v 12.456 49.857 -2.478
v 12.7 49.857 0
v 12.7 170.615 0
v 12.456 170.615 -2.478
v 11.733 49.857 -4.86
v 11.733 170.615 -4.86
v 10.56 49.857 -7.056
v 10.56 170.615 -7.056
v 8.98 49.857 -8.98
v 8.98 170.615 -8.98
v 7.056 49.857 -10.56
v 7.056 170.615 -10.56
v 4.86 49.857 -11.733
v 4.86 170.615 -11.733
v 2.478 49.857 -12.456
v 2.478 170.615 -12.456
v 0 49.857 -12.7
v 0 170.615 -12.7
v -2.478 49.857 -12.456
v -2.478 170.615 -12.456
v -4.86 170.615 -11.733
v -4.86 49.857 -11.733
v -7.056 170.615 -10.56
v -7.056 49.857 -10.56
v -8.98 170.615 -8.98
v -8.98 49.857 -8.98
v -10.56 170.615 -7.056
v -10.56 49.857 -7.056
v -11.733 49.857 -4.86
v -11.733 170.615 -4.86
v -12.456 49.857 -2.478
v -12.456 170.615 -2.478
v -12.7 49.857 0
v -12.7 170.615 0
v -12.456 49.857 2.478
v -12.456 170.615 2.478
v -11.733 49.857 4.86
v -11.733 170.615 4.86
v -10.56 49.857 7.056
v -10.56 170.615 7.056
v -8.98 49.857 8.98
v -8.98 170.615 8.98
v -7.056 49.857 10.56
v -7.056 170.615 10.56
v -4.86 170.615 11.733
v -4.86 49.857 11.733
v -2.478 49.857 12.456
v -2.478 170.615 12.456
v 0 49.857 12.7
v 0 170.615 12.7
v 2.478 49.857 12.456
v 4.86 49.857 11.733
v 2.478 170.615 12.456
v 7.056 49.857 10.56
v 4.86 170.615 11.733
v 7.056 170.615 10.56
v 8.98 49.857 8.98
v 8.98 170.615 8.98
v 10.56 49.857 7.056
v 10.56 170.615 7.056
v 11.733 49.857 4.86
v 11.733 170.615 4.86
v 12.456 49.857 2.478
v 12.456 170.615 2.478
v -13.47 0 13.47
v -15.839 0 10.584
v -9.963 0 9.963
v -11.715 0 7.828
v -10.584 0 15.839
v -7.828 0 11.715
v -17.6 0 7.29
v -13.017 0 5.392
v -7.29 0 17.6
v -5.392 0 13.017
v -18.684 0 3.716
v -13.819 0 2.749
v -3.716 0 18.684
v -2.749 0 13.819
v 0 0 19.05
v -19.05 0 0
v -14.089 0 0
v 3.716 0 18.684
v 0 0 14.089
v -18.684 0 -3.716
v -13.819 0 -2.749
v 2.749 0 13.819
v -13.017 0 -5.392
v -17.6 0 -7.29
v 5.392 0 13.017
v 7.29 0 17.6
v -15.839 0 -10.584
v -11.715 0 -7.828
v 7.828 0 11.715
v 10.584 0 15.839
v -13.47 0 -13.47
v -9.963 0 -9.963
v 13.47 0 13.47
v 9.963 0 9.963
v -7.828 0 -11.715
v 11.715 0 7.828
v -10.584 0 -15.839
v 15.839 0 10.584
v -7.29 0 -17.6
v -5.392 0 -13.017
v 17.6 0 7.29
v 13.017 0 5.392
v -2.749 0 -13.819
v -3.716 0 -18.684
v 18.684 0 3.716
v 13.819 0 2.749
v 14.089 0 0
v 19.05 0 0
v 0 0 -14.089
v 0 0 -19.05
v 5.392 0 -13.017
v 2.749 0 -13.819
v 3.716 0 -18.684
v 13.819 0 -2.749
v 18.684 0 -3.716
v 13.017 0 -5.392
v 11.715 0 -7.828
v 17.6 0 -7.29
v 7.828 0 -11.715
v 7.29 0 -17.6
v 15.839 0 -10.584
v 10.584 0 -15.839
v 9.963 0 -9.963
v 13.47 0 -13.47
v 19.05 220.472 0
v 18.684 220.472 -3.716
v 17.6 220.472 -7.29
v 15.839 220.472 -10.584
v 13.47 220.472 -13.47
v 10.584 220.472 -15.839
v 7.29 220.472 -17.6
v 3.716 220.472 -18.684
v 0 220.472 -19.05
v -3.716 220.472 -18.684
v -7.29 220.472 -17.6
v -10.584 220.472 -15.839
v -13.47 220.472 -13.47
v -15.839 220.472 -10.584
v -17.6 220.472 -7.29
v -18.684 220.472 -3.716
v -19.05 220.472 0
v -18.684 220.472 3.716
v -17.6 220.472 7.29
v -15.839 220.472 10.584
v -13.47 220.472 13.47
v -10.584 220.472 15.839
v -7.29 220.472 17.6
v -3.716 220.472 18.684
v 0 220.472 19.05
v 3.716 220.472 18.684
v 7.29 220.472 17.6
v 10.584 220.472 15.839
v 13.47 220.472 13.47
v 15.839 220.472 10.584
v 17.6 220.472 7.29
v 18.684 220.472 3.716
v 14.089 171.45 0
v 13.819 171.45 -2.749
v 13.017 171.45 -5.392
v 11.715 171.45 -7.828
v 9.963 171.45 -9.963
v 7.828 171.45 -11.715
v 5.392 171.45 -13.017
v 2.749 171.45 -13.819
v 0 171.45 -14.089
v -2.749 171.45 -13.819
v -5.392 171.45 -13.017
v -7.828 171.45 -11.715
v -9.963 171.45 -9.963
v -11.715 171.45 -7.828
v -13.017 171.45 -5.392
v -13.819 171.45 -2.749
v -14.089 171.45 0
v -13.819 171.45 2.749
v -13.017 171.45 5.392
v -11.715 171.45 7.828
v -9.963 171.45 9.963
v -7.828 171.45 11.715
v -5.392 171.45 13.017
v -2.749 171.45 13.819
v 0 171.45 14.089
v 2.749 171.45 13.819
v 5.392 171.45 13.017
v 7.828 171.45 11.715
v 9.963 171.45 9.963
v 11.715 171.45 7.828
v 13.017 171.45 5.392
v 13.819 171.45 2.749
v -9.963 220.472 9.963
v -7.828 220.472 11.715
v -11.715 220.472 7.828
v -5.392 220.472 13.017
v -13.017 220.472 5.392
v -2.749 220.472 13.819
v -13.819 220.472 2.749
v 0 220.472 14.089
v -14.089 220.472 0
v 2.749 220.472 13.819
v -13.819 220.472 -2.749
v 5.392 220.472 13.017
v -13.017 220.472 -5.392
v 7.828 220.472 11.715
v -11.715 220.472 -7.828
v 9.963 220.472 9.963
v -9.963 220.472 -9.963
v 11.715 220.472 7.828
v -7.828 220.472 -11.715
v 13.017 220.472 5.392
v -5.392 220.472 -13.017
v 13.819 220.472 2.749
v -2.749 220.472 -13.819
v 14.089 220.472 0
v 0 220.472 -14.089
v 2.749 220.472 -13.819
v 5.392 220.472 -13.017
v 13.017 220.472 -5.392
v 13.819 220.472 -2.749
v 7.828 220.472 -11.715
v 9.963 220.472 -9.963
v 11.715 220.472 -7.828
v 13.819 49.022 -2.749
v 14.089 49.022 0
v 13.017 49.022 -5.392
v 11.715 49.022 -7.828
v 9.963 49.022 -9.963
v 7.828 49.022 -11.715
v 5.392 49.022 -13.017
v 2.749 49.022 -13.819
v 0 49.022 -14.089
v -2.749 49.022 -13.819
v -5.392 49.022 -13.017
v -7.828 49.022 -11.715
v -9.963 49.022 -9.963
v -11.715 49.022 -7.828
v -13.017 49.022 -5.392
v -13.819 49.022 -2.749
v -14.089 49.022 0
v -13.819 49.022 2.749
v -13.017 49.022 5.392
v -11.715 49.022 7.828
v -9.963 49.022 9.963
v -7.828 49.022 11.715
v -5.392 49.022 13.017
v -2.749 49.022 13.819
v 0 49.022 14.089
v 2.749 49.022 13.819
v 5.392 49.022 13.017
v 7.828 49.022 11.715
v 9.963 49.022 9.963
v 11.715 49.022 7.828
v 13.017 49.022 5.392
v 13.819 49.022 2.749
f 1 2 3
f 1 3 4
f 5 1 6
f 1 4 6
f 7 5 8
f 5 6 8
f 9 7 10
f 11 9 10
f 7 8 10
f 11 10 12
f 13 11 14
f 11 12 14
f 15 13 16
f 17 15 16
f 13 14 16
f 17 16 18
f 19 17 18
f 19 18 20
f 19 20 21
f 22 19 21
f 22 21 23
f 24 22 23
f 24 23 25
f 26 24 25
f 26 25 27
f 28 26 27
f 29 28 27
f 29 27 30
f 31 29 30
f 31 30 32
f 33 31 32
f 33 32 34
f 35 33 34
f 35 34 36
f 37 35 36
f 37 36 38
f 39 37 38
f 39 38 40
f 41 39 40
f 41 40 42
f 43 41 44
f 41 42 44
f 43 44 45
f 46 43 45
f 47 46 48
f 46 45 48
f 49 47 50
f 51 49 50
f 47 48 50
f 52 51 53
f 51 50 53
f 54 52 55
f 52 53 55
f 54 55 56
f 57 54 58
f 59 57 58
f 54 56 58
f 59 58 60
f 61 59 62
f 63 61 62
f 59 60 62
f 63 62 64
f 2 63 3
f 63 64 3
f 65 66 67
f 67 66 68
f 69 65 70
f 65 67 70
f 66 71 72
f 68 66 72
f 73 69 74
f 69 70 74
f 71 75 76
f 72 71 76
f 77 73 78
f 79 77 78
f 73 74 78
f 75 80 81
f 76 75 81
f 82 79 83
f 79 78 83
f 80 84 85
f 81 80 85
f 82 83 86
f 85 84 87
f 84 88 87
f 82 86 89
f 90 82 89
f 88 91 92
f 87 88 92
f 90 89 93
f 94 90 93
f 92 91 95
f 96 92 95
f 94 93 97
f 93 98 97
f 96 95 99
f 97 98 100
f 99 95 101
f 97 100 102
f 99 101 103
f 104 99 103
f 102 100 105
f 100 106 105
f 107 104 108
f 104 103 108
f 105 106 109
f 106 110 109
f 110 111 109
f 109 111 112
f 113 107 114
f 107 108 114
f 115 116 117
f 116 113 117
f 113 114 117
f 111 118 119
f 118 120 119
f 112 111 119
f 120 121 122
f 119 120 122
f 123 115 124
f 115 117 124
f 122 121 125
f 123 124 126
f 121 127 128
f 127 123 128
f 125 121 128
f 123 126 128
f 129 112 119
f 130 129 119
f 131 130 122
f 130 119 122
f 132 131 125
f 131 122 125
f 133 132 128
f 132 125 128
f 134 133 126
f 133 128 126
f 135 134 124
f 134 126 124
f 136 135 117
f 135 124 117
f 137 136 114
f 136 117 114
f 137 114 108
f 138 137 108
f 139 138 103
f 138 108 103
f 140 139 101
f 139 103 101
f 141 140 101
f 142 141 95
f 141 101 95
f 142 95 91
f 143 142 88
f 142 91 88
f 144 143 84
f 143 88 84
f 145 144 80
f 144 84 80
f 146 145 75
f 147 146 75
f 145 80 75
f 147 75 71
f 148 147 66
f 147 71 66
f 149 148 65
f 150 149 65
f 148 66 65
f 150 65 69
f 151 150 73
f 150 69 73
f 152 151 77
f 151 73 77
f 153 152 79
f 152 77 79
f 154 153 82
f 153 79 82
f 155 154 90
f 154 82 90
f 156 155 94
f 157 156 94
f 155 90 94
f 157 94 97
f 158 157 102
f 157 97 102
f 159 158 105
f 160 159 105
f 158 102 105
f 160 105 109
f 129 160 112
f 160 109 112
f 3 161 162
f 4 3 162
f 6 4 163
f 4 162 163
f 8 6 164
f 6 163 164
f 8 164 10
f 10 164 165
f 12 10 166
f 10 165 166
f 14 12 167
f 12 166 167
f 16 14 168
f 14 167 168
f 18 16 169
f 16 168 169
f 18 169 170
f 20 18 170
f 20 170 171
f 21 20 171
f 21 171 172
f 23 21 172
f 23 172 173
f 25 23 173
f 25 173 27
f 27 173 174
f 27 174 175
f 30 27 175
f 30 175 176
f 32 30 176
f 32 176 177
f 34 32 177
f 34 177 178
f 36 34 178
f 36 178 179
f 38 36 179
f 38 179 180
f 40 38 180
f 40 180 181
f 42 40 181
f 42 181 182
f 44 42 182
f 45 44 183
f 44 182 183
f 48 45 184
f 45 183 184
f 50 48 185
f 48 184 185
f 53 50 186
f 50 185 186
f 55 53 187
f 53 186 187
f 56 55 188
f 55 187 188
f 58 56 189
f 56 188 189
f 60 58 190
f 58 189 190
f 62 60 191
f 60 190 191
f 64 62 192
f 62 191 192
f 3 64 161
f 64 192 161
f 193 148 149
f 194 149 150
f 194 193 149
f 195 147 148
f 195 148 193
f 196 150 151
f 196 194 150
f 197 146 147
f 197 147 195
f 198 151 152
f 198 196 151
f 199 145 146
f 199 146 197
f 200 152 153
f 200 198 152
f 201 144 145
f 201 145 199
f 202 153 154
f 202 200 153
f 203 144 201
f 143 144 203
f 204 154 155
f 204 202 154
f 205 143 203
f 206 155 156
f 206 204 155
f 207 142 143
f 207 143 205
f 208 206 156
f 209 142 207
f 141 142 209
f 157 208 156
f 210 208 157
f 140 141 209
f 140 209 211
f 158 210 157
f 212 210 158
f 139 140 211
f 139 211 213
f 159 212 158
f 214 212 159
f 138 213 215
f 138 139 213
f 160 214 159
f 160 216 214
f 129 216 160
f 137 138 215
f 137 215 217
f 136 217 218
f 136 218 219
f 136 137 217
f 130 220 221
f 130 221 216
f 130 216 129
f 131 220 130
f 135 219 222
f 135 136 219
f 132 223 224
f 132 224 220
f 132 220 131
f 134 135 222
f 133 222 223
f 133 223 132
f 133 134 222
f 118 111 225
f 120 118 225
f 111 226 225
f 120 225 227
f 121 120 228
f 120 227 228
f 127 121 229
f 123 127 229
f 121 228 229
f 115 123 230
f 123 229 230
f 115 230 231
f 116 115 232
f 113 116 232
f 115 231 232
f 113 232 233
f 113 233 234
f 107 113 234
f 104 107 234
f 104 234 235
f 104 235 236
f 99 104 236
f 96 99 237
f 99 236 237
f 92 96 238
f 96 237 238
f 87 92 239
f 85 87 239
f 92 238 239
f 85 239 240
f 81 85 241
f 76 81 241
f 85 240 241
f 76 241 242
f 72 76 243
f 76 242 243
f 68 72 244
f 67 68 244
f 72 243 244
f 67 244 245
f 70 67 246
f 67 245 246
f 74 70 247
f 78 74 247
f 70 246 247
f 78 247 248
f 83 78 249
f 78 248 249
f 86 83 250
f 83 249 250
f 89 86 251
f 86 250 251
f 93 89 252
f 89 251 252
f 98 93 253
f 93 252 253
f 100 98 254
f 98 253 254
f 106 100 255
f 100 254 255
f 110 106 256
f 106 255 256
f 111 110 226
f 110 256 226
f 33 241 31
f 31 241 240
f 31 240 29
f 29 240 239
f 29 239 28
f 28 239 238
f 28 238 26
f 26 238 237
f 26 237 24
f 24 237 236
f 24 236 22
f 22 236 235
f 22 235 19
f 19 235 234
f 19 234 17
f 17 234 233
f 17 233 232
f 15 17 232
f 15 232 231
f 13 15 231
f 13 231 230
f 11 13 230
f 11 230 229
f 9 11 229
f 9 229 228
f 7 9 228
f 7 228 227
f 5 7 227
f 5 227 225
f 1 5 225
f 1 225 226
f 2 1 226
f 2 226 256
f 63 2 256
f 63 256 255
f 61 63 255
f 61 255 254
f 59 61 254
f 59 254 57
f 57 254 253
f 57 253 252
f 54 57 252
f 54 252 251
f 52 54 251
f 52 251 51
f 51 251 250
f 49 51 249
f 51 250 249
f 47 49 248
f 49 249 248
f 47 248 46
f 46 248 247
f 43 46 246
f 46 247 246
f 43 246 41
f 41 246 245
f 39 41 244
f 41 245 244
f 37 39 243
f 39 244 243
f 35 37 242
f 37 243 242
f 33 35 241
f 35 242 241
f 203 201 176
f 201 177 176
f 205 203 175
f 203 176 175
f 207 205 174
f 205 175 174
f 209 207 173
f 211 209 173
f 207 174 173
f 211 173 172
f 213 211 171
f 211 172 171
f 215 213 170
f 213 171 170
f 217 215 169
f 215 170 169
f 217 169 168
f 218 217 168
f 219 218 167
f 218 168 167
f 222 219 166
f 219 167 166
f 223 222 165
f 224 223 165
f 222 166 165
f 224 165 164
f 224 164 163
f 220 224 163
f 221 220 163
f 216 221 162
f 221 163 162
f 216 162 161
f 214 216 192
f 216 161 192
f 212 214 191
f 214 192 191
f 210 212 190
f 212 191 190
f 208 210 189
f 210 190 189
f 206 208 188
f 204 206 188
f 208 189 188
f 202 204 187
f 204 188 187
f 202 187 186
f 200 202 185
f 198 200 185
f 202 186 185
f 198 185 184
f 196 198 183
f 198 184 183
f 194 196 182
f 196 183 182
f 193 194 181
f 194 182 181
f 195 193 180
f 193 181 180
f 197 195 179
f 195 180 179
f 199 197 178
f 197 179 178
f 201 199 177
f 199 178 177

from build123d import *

# Parameters (mm, degrees)
SKETCH1_R                    = 19.05
BOSS_EXTRUDE1_DEPTH          = 220.472
SKETCH2_R                    = 12.7
CUT_EXTRUDE1_DEPTH           = 221.472
F_1_1_4_7_TAPPED_HOLE1_D     = 28.17876
F_1_1_4_7_TAPPED_HOLE1_DEPTH = 49.022
F_1_1_4_7_TAPPED_HOLE1_TIP   = 8.465753589
F_1_1_4_7_TAPPED_HOLE2_D     = 28.17876
F_1_1_4_7_TAPPED_HOLE2_DEPTH = 49.022
F_1_1_4_7_TAPPED_HOLE2_TIP   = 8.465753589


with BuildPart() as part:
    # Sketch1 → Boss-Extrude1 (new body)
    with BuildSketch(Plane(origin=(0, 0, 0), x_dir=(1, 0, 0), z_dir=(0, 1, 0))):
        Circle(SKETCH1_R)
    extrude(amount=BOSS_EXTRUDE1_DEPTH)

    # Sketch2 → Cut-Extrude1 (cut, through all)
    with BuildSketch(Plane(origin=(0, 220.472, 0), x_dir=(1, 0, 0), z_dir=(0, 1, 0))):
        Circle(SKETCH2_R)
    extrude(amount=-CUT_EXTRUDE1_DEPTH, mode=Mode.SUBTRACT)

    # 1-1/4-7 Tapped Hole1
    with Locations(Plane(origin=(0, 220.472, 0), x_dir=(1, 0, 0), z_dir=(0, 1, 0))):
        with Locations((0, 0)):
            Hole(F_1_1_4_7_TAPPED_HOLE1_D / 2, depth=F_1_1_4_7_TAPPED_HOLE1_DEPTH)
            with Locations((0, 0, -(F_1_1_4_7_TAPPED_HOLE1_DEPTH + F_1_1_4_7_TAPPED_HOLE1_TIP / 2))):  # 118° drill point
                Cone(0, F_1_1_4_7_TAPPED_HOLE1_D / 2, F_1_1_4_7_TAPPED_HOLE1_TIP, mode=Mode.SUBTRACT)

    # 1-1/4-7 Tapped Hole2
    with Locations(Plane(origin=(0, 0, 0), x_dir=(-1, 0, 0), z_dir=(0, -1, 0))):
        with Locations((0, 0)):
            Hole(F_1_1_4_7_TAPPED_HOLE2_D / 2, depth=F_1_1_4_7_TAPPED_HOLE2_DEPTH)
            with Locations((0, 0, -(F_1_1_4_7_TAPPED_HOLE2_DEPTH + F_1_1_4_7_TAPPED_HOLE2_TIP / 2))):  # 118° drill point
                Cone(0, F_1_1_4_7_TAPPED_HOLE2_D / 2, F_1_1_4_7_TAPPED_HOLE2_TIP, mode=Mode.SUBTRACT)


solid = part.part
